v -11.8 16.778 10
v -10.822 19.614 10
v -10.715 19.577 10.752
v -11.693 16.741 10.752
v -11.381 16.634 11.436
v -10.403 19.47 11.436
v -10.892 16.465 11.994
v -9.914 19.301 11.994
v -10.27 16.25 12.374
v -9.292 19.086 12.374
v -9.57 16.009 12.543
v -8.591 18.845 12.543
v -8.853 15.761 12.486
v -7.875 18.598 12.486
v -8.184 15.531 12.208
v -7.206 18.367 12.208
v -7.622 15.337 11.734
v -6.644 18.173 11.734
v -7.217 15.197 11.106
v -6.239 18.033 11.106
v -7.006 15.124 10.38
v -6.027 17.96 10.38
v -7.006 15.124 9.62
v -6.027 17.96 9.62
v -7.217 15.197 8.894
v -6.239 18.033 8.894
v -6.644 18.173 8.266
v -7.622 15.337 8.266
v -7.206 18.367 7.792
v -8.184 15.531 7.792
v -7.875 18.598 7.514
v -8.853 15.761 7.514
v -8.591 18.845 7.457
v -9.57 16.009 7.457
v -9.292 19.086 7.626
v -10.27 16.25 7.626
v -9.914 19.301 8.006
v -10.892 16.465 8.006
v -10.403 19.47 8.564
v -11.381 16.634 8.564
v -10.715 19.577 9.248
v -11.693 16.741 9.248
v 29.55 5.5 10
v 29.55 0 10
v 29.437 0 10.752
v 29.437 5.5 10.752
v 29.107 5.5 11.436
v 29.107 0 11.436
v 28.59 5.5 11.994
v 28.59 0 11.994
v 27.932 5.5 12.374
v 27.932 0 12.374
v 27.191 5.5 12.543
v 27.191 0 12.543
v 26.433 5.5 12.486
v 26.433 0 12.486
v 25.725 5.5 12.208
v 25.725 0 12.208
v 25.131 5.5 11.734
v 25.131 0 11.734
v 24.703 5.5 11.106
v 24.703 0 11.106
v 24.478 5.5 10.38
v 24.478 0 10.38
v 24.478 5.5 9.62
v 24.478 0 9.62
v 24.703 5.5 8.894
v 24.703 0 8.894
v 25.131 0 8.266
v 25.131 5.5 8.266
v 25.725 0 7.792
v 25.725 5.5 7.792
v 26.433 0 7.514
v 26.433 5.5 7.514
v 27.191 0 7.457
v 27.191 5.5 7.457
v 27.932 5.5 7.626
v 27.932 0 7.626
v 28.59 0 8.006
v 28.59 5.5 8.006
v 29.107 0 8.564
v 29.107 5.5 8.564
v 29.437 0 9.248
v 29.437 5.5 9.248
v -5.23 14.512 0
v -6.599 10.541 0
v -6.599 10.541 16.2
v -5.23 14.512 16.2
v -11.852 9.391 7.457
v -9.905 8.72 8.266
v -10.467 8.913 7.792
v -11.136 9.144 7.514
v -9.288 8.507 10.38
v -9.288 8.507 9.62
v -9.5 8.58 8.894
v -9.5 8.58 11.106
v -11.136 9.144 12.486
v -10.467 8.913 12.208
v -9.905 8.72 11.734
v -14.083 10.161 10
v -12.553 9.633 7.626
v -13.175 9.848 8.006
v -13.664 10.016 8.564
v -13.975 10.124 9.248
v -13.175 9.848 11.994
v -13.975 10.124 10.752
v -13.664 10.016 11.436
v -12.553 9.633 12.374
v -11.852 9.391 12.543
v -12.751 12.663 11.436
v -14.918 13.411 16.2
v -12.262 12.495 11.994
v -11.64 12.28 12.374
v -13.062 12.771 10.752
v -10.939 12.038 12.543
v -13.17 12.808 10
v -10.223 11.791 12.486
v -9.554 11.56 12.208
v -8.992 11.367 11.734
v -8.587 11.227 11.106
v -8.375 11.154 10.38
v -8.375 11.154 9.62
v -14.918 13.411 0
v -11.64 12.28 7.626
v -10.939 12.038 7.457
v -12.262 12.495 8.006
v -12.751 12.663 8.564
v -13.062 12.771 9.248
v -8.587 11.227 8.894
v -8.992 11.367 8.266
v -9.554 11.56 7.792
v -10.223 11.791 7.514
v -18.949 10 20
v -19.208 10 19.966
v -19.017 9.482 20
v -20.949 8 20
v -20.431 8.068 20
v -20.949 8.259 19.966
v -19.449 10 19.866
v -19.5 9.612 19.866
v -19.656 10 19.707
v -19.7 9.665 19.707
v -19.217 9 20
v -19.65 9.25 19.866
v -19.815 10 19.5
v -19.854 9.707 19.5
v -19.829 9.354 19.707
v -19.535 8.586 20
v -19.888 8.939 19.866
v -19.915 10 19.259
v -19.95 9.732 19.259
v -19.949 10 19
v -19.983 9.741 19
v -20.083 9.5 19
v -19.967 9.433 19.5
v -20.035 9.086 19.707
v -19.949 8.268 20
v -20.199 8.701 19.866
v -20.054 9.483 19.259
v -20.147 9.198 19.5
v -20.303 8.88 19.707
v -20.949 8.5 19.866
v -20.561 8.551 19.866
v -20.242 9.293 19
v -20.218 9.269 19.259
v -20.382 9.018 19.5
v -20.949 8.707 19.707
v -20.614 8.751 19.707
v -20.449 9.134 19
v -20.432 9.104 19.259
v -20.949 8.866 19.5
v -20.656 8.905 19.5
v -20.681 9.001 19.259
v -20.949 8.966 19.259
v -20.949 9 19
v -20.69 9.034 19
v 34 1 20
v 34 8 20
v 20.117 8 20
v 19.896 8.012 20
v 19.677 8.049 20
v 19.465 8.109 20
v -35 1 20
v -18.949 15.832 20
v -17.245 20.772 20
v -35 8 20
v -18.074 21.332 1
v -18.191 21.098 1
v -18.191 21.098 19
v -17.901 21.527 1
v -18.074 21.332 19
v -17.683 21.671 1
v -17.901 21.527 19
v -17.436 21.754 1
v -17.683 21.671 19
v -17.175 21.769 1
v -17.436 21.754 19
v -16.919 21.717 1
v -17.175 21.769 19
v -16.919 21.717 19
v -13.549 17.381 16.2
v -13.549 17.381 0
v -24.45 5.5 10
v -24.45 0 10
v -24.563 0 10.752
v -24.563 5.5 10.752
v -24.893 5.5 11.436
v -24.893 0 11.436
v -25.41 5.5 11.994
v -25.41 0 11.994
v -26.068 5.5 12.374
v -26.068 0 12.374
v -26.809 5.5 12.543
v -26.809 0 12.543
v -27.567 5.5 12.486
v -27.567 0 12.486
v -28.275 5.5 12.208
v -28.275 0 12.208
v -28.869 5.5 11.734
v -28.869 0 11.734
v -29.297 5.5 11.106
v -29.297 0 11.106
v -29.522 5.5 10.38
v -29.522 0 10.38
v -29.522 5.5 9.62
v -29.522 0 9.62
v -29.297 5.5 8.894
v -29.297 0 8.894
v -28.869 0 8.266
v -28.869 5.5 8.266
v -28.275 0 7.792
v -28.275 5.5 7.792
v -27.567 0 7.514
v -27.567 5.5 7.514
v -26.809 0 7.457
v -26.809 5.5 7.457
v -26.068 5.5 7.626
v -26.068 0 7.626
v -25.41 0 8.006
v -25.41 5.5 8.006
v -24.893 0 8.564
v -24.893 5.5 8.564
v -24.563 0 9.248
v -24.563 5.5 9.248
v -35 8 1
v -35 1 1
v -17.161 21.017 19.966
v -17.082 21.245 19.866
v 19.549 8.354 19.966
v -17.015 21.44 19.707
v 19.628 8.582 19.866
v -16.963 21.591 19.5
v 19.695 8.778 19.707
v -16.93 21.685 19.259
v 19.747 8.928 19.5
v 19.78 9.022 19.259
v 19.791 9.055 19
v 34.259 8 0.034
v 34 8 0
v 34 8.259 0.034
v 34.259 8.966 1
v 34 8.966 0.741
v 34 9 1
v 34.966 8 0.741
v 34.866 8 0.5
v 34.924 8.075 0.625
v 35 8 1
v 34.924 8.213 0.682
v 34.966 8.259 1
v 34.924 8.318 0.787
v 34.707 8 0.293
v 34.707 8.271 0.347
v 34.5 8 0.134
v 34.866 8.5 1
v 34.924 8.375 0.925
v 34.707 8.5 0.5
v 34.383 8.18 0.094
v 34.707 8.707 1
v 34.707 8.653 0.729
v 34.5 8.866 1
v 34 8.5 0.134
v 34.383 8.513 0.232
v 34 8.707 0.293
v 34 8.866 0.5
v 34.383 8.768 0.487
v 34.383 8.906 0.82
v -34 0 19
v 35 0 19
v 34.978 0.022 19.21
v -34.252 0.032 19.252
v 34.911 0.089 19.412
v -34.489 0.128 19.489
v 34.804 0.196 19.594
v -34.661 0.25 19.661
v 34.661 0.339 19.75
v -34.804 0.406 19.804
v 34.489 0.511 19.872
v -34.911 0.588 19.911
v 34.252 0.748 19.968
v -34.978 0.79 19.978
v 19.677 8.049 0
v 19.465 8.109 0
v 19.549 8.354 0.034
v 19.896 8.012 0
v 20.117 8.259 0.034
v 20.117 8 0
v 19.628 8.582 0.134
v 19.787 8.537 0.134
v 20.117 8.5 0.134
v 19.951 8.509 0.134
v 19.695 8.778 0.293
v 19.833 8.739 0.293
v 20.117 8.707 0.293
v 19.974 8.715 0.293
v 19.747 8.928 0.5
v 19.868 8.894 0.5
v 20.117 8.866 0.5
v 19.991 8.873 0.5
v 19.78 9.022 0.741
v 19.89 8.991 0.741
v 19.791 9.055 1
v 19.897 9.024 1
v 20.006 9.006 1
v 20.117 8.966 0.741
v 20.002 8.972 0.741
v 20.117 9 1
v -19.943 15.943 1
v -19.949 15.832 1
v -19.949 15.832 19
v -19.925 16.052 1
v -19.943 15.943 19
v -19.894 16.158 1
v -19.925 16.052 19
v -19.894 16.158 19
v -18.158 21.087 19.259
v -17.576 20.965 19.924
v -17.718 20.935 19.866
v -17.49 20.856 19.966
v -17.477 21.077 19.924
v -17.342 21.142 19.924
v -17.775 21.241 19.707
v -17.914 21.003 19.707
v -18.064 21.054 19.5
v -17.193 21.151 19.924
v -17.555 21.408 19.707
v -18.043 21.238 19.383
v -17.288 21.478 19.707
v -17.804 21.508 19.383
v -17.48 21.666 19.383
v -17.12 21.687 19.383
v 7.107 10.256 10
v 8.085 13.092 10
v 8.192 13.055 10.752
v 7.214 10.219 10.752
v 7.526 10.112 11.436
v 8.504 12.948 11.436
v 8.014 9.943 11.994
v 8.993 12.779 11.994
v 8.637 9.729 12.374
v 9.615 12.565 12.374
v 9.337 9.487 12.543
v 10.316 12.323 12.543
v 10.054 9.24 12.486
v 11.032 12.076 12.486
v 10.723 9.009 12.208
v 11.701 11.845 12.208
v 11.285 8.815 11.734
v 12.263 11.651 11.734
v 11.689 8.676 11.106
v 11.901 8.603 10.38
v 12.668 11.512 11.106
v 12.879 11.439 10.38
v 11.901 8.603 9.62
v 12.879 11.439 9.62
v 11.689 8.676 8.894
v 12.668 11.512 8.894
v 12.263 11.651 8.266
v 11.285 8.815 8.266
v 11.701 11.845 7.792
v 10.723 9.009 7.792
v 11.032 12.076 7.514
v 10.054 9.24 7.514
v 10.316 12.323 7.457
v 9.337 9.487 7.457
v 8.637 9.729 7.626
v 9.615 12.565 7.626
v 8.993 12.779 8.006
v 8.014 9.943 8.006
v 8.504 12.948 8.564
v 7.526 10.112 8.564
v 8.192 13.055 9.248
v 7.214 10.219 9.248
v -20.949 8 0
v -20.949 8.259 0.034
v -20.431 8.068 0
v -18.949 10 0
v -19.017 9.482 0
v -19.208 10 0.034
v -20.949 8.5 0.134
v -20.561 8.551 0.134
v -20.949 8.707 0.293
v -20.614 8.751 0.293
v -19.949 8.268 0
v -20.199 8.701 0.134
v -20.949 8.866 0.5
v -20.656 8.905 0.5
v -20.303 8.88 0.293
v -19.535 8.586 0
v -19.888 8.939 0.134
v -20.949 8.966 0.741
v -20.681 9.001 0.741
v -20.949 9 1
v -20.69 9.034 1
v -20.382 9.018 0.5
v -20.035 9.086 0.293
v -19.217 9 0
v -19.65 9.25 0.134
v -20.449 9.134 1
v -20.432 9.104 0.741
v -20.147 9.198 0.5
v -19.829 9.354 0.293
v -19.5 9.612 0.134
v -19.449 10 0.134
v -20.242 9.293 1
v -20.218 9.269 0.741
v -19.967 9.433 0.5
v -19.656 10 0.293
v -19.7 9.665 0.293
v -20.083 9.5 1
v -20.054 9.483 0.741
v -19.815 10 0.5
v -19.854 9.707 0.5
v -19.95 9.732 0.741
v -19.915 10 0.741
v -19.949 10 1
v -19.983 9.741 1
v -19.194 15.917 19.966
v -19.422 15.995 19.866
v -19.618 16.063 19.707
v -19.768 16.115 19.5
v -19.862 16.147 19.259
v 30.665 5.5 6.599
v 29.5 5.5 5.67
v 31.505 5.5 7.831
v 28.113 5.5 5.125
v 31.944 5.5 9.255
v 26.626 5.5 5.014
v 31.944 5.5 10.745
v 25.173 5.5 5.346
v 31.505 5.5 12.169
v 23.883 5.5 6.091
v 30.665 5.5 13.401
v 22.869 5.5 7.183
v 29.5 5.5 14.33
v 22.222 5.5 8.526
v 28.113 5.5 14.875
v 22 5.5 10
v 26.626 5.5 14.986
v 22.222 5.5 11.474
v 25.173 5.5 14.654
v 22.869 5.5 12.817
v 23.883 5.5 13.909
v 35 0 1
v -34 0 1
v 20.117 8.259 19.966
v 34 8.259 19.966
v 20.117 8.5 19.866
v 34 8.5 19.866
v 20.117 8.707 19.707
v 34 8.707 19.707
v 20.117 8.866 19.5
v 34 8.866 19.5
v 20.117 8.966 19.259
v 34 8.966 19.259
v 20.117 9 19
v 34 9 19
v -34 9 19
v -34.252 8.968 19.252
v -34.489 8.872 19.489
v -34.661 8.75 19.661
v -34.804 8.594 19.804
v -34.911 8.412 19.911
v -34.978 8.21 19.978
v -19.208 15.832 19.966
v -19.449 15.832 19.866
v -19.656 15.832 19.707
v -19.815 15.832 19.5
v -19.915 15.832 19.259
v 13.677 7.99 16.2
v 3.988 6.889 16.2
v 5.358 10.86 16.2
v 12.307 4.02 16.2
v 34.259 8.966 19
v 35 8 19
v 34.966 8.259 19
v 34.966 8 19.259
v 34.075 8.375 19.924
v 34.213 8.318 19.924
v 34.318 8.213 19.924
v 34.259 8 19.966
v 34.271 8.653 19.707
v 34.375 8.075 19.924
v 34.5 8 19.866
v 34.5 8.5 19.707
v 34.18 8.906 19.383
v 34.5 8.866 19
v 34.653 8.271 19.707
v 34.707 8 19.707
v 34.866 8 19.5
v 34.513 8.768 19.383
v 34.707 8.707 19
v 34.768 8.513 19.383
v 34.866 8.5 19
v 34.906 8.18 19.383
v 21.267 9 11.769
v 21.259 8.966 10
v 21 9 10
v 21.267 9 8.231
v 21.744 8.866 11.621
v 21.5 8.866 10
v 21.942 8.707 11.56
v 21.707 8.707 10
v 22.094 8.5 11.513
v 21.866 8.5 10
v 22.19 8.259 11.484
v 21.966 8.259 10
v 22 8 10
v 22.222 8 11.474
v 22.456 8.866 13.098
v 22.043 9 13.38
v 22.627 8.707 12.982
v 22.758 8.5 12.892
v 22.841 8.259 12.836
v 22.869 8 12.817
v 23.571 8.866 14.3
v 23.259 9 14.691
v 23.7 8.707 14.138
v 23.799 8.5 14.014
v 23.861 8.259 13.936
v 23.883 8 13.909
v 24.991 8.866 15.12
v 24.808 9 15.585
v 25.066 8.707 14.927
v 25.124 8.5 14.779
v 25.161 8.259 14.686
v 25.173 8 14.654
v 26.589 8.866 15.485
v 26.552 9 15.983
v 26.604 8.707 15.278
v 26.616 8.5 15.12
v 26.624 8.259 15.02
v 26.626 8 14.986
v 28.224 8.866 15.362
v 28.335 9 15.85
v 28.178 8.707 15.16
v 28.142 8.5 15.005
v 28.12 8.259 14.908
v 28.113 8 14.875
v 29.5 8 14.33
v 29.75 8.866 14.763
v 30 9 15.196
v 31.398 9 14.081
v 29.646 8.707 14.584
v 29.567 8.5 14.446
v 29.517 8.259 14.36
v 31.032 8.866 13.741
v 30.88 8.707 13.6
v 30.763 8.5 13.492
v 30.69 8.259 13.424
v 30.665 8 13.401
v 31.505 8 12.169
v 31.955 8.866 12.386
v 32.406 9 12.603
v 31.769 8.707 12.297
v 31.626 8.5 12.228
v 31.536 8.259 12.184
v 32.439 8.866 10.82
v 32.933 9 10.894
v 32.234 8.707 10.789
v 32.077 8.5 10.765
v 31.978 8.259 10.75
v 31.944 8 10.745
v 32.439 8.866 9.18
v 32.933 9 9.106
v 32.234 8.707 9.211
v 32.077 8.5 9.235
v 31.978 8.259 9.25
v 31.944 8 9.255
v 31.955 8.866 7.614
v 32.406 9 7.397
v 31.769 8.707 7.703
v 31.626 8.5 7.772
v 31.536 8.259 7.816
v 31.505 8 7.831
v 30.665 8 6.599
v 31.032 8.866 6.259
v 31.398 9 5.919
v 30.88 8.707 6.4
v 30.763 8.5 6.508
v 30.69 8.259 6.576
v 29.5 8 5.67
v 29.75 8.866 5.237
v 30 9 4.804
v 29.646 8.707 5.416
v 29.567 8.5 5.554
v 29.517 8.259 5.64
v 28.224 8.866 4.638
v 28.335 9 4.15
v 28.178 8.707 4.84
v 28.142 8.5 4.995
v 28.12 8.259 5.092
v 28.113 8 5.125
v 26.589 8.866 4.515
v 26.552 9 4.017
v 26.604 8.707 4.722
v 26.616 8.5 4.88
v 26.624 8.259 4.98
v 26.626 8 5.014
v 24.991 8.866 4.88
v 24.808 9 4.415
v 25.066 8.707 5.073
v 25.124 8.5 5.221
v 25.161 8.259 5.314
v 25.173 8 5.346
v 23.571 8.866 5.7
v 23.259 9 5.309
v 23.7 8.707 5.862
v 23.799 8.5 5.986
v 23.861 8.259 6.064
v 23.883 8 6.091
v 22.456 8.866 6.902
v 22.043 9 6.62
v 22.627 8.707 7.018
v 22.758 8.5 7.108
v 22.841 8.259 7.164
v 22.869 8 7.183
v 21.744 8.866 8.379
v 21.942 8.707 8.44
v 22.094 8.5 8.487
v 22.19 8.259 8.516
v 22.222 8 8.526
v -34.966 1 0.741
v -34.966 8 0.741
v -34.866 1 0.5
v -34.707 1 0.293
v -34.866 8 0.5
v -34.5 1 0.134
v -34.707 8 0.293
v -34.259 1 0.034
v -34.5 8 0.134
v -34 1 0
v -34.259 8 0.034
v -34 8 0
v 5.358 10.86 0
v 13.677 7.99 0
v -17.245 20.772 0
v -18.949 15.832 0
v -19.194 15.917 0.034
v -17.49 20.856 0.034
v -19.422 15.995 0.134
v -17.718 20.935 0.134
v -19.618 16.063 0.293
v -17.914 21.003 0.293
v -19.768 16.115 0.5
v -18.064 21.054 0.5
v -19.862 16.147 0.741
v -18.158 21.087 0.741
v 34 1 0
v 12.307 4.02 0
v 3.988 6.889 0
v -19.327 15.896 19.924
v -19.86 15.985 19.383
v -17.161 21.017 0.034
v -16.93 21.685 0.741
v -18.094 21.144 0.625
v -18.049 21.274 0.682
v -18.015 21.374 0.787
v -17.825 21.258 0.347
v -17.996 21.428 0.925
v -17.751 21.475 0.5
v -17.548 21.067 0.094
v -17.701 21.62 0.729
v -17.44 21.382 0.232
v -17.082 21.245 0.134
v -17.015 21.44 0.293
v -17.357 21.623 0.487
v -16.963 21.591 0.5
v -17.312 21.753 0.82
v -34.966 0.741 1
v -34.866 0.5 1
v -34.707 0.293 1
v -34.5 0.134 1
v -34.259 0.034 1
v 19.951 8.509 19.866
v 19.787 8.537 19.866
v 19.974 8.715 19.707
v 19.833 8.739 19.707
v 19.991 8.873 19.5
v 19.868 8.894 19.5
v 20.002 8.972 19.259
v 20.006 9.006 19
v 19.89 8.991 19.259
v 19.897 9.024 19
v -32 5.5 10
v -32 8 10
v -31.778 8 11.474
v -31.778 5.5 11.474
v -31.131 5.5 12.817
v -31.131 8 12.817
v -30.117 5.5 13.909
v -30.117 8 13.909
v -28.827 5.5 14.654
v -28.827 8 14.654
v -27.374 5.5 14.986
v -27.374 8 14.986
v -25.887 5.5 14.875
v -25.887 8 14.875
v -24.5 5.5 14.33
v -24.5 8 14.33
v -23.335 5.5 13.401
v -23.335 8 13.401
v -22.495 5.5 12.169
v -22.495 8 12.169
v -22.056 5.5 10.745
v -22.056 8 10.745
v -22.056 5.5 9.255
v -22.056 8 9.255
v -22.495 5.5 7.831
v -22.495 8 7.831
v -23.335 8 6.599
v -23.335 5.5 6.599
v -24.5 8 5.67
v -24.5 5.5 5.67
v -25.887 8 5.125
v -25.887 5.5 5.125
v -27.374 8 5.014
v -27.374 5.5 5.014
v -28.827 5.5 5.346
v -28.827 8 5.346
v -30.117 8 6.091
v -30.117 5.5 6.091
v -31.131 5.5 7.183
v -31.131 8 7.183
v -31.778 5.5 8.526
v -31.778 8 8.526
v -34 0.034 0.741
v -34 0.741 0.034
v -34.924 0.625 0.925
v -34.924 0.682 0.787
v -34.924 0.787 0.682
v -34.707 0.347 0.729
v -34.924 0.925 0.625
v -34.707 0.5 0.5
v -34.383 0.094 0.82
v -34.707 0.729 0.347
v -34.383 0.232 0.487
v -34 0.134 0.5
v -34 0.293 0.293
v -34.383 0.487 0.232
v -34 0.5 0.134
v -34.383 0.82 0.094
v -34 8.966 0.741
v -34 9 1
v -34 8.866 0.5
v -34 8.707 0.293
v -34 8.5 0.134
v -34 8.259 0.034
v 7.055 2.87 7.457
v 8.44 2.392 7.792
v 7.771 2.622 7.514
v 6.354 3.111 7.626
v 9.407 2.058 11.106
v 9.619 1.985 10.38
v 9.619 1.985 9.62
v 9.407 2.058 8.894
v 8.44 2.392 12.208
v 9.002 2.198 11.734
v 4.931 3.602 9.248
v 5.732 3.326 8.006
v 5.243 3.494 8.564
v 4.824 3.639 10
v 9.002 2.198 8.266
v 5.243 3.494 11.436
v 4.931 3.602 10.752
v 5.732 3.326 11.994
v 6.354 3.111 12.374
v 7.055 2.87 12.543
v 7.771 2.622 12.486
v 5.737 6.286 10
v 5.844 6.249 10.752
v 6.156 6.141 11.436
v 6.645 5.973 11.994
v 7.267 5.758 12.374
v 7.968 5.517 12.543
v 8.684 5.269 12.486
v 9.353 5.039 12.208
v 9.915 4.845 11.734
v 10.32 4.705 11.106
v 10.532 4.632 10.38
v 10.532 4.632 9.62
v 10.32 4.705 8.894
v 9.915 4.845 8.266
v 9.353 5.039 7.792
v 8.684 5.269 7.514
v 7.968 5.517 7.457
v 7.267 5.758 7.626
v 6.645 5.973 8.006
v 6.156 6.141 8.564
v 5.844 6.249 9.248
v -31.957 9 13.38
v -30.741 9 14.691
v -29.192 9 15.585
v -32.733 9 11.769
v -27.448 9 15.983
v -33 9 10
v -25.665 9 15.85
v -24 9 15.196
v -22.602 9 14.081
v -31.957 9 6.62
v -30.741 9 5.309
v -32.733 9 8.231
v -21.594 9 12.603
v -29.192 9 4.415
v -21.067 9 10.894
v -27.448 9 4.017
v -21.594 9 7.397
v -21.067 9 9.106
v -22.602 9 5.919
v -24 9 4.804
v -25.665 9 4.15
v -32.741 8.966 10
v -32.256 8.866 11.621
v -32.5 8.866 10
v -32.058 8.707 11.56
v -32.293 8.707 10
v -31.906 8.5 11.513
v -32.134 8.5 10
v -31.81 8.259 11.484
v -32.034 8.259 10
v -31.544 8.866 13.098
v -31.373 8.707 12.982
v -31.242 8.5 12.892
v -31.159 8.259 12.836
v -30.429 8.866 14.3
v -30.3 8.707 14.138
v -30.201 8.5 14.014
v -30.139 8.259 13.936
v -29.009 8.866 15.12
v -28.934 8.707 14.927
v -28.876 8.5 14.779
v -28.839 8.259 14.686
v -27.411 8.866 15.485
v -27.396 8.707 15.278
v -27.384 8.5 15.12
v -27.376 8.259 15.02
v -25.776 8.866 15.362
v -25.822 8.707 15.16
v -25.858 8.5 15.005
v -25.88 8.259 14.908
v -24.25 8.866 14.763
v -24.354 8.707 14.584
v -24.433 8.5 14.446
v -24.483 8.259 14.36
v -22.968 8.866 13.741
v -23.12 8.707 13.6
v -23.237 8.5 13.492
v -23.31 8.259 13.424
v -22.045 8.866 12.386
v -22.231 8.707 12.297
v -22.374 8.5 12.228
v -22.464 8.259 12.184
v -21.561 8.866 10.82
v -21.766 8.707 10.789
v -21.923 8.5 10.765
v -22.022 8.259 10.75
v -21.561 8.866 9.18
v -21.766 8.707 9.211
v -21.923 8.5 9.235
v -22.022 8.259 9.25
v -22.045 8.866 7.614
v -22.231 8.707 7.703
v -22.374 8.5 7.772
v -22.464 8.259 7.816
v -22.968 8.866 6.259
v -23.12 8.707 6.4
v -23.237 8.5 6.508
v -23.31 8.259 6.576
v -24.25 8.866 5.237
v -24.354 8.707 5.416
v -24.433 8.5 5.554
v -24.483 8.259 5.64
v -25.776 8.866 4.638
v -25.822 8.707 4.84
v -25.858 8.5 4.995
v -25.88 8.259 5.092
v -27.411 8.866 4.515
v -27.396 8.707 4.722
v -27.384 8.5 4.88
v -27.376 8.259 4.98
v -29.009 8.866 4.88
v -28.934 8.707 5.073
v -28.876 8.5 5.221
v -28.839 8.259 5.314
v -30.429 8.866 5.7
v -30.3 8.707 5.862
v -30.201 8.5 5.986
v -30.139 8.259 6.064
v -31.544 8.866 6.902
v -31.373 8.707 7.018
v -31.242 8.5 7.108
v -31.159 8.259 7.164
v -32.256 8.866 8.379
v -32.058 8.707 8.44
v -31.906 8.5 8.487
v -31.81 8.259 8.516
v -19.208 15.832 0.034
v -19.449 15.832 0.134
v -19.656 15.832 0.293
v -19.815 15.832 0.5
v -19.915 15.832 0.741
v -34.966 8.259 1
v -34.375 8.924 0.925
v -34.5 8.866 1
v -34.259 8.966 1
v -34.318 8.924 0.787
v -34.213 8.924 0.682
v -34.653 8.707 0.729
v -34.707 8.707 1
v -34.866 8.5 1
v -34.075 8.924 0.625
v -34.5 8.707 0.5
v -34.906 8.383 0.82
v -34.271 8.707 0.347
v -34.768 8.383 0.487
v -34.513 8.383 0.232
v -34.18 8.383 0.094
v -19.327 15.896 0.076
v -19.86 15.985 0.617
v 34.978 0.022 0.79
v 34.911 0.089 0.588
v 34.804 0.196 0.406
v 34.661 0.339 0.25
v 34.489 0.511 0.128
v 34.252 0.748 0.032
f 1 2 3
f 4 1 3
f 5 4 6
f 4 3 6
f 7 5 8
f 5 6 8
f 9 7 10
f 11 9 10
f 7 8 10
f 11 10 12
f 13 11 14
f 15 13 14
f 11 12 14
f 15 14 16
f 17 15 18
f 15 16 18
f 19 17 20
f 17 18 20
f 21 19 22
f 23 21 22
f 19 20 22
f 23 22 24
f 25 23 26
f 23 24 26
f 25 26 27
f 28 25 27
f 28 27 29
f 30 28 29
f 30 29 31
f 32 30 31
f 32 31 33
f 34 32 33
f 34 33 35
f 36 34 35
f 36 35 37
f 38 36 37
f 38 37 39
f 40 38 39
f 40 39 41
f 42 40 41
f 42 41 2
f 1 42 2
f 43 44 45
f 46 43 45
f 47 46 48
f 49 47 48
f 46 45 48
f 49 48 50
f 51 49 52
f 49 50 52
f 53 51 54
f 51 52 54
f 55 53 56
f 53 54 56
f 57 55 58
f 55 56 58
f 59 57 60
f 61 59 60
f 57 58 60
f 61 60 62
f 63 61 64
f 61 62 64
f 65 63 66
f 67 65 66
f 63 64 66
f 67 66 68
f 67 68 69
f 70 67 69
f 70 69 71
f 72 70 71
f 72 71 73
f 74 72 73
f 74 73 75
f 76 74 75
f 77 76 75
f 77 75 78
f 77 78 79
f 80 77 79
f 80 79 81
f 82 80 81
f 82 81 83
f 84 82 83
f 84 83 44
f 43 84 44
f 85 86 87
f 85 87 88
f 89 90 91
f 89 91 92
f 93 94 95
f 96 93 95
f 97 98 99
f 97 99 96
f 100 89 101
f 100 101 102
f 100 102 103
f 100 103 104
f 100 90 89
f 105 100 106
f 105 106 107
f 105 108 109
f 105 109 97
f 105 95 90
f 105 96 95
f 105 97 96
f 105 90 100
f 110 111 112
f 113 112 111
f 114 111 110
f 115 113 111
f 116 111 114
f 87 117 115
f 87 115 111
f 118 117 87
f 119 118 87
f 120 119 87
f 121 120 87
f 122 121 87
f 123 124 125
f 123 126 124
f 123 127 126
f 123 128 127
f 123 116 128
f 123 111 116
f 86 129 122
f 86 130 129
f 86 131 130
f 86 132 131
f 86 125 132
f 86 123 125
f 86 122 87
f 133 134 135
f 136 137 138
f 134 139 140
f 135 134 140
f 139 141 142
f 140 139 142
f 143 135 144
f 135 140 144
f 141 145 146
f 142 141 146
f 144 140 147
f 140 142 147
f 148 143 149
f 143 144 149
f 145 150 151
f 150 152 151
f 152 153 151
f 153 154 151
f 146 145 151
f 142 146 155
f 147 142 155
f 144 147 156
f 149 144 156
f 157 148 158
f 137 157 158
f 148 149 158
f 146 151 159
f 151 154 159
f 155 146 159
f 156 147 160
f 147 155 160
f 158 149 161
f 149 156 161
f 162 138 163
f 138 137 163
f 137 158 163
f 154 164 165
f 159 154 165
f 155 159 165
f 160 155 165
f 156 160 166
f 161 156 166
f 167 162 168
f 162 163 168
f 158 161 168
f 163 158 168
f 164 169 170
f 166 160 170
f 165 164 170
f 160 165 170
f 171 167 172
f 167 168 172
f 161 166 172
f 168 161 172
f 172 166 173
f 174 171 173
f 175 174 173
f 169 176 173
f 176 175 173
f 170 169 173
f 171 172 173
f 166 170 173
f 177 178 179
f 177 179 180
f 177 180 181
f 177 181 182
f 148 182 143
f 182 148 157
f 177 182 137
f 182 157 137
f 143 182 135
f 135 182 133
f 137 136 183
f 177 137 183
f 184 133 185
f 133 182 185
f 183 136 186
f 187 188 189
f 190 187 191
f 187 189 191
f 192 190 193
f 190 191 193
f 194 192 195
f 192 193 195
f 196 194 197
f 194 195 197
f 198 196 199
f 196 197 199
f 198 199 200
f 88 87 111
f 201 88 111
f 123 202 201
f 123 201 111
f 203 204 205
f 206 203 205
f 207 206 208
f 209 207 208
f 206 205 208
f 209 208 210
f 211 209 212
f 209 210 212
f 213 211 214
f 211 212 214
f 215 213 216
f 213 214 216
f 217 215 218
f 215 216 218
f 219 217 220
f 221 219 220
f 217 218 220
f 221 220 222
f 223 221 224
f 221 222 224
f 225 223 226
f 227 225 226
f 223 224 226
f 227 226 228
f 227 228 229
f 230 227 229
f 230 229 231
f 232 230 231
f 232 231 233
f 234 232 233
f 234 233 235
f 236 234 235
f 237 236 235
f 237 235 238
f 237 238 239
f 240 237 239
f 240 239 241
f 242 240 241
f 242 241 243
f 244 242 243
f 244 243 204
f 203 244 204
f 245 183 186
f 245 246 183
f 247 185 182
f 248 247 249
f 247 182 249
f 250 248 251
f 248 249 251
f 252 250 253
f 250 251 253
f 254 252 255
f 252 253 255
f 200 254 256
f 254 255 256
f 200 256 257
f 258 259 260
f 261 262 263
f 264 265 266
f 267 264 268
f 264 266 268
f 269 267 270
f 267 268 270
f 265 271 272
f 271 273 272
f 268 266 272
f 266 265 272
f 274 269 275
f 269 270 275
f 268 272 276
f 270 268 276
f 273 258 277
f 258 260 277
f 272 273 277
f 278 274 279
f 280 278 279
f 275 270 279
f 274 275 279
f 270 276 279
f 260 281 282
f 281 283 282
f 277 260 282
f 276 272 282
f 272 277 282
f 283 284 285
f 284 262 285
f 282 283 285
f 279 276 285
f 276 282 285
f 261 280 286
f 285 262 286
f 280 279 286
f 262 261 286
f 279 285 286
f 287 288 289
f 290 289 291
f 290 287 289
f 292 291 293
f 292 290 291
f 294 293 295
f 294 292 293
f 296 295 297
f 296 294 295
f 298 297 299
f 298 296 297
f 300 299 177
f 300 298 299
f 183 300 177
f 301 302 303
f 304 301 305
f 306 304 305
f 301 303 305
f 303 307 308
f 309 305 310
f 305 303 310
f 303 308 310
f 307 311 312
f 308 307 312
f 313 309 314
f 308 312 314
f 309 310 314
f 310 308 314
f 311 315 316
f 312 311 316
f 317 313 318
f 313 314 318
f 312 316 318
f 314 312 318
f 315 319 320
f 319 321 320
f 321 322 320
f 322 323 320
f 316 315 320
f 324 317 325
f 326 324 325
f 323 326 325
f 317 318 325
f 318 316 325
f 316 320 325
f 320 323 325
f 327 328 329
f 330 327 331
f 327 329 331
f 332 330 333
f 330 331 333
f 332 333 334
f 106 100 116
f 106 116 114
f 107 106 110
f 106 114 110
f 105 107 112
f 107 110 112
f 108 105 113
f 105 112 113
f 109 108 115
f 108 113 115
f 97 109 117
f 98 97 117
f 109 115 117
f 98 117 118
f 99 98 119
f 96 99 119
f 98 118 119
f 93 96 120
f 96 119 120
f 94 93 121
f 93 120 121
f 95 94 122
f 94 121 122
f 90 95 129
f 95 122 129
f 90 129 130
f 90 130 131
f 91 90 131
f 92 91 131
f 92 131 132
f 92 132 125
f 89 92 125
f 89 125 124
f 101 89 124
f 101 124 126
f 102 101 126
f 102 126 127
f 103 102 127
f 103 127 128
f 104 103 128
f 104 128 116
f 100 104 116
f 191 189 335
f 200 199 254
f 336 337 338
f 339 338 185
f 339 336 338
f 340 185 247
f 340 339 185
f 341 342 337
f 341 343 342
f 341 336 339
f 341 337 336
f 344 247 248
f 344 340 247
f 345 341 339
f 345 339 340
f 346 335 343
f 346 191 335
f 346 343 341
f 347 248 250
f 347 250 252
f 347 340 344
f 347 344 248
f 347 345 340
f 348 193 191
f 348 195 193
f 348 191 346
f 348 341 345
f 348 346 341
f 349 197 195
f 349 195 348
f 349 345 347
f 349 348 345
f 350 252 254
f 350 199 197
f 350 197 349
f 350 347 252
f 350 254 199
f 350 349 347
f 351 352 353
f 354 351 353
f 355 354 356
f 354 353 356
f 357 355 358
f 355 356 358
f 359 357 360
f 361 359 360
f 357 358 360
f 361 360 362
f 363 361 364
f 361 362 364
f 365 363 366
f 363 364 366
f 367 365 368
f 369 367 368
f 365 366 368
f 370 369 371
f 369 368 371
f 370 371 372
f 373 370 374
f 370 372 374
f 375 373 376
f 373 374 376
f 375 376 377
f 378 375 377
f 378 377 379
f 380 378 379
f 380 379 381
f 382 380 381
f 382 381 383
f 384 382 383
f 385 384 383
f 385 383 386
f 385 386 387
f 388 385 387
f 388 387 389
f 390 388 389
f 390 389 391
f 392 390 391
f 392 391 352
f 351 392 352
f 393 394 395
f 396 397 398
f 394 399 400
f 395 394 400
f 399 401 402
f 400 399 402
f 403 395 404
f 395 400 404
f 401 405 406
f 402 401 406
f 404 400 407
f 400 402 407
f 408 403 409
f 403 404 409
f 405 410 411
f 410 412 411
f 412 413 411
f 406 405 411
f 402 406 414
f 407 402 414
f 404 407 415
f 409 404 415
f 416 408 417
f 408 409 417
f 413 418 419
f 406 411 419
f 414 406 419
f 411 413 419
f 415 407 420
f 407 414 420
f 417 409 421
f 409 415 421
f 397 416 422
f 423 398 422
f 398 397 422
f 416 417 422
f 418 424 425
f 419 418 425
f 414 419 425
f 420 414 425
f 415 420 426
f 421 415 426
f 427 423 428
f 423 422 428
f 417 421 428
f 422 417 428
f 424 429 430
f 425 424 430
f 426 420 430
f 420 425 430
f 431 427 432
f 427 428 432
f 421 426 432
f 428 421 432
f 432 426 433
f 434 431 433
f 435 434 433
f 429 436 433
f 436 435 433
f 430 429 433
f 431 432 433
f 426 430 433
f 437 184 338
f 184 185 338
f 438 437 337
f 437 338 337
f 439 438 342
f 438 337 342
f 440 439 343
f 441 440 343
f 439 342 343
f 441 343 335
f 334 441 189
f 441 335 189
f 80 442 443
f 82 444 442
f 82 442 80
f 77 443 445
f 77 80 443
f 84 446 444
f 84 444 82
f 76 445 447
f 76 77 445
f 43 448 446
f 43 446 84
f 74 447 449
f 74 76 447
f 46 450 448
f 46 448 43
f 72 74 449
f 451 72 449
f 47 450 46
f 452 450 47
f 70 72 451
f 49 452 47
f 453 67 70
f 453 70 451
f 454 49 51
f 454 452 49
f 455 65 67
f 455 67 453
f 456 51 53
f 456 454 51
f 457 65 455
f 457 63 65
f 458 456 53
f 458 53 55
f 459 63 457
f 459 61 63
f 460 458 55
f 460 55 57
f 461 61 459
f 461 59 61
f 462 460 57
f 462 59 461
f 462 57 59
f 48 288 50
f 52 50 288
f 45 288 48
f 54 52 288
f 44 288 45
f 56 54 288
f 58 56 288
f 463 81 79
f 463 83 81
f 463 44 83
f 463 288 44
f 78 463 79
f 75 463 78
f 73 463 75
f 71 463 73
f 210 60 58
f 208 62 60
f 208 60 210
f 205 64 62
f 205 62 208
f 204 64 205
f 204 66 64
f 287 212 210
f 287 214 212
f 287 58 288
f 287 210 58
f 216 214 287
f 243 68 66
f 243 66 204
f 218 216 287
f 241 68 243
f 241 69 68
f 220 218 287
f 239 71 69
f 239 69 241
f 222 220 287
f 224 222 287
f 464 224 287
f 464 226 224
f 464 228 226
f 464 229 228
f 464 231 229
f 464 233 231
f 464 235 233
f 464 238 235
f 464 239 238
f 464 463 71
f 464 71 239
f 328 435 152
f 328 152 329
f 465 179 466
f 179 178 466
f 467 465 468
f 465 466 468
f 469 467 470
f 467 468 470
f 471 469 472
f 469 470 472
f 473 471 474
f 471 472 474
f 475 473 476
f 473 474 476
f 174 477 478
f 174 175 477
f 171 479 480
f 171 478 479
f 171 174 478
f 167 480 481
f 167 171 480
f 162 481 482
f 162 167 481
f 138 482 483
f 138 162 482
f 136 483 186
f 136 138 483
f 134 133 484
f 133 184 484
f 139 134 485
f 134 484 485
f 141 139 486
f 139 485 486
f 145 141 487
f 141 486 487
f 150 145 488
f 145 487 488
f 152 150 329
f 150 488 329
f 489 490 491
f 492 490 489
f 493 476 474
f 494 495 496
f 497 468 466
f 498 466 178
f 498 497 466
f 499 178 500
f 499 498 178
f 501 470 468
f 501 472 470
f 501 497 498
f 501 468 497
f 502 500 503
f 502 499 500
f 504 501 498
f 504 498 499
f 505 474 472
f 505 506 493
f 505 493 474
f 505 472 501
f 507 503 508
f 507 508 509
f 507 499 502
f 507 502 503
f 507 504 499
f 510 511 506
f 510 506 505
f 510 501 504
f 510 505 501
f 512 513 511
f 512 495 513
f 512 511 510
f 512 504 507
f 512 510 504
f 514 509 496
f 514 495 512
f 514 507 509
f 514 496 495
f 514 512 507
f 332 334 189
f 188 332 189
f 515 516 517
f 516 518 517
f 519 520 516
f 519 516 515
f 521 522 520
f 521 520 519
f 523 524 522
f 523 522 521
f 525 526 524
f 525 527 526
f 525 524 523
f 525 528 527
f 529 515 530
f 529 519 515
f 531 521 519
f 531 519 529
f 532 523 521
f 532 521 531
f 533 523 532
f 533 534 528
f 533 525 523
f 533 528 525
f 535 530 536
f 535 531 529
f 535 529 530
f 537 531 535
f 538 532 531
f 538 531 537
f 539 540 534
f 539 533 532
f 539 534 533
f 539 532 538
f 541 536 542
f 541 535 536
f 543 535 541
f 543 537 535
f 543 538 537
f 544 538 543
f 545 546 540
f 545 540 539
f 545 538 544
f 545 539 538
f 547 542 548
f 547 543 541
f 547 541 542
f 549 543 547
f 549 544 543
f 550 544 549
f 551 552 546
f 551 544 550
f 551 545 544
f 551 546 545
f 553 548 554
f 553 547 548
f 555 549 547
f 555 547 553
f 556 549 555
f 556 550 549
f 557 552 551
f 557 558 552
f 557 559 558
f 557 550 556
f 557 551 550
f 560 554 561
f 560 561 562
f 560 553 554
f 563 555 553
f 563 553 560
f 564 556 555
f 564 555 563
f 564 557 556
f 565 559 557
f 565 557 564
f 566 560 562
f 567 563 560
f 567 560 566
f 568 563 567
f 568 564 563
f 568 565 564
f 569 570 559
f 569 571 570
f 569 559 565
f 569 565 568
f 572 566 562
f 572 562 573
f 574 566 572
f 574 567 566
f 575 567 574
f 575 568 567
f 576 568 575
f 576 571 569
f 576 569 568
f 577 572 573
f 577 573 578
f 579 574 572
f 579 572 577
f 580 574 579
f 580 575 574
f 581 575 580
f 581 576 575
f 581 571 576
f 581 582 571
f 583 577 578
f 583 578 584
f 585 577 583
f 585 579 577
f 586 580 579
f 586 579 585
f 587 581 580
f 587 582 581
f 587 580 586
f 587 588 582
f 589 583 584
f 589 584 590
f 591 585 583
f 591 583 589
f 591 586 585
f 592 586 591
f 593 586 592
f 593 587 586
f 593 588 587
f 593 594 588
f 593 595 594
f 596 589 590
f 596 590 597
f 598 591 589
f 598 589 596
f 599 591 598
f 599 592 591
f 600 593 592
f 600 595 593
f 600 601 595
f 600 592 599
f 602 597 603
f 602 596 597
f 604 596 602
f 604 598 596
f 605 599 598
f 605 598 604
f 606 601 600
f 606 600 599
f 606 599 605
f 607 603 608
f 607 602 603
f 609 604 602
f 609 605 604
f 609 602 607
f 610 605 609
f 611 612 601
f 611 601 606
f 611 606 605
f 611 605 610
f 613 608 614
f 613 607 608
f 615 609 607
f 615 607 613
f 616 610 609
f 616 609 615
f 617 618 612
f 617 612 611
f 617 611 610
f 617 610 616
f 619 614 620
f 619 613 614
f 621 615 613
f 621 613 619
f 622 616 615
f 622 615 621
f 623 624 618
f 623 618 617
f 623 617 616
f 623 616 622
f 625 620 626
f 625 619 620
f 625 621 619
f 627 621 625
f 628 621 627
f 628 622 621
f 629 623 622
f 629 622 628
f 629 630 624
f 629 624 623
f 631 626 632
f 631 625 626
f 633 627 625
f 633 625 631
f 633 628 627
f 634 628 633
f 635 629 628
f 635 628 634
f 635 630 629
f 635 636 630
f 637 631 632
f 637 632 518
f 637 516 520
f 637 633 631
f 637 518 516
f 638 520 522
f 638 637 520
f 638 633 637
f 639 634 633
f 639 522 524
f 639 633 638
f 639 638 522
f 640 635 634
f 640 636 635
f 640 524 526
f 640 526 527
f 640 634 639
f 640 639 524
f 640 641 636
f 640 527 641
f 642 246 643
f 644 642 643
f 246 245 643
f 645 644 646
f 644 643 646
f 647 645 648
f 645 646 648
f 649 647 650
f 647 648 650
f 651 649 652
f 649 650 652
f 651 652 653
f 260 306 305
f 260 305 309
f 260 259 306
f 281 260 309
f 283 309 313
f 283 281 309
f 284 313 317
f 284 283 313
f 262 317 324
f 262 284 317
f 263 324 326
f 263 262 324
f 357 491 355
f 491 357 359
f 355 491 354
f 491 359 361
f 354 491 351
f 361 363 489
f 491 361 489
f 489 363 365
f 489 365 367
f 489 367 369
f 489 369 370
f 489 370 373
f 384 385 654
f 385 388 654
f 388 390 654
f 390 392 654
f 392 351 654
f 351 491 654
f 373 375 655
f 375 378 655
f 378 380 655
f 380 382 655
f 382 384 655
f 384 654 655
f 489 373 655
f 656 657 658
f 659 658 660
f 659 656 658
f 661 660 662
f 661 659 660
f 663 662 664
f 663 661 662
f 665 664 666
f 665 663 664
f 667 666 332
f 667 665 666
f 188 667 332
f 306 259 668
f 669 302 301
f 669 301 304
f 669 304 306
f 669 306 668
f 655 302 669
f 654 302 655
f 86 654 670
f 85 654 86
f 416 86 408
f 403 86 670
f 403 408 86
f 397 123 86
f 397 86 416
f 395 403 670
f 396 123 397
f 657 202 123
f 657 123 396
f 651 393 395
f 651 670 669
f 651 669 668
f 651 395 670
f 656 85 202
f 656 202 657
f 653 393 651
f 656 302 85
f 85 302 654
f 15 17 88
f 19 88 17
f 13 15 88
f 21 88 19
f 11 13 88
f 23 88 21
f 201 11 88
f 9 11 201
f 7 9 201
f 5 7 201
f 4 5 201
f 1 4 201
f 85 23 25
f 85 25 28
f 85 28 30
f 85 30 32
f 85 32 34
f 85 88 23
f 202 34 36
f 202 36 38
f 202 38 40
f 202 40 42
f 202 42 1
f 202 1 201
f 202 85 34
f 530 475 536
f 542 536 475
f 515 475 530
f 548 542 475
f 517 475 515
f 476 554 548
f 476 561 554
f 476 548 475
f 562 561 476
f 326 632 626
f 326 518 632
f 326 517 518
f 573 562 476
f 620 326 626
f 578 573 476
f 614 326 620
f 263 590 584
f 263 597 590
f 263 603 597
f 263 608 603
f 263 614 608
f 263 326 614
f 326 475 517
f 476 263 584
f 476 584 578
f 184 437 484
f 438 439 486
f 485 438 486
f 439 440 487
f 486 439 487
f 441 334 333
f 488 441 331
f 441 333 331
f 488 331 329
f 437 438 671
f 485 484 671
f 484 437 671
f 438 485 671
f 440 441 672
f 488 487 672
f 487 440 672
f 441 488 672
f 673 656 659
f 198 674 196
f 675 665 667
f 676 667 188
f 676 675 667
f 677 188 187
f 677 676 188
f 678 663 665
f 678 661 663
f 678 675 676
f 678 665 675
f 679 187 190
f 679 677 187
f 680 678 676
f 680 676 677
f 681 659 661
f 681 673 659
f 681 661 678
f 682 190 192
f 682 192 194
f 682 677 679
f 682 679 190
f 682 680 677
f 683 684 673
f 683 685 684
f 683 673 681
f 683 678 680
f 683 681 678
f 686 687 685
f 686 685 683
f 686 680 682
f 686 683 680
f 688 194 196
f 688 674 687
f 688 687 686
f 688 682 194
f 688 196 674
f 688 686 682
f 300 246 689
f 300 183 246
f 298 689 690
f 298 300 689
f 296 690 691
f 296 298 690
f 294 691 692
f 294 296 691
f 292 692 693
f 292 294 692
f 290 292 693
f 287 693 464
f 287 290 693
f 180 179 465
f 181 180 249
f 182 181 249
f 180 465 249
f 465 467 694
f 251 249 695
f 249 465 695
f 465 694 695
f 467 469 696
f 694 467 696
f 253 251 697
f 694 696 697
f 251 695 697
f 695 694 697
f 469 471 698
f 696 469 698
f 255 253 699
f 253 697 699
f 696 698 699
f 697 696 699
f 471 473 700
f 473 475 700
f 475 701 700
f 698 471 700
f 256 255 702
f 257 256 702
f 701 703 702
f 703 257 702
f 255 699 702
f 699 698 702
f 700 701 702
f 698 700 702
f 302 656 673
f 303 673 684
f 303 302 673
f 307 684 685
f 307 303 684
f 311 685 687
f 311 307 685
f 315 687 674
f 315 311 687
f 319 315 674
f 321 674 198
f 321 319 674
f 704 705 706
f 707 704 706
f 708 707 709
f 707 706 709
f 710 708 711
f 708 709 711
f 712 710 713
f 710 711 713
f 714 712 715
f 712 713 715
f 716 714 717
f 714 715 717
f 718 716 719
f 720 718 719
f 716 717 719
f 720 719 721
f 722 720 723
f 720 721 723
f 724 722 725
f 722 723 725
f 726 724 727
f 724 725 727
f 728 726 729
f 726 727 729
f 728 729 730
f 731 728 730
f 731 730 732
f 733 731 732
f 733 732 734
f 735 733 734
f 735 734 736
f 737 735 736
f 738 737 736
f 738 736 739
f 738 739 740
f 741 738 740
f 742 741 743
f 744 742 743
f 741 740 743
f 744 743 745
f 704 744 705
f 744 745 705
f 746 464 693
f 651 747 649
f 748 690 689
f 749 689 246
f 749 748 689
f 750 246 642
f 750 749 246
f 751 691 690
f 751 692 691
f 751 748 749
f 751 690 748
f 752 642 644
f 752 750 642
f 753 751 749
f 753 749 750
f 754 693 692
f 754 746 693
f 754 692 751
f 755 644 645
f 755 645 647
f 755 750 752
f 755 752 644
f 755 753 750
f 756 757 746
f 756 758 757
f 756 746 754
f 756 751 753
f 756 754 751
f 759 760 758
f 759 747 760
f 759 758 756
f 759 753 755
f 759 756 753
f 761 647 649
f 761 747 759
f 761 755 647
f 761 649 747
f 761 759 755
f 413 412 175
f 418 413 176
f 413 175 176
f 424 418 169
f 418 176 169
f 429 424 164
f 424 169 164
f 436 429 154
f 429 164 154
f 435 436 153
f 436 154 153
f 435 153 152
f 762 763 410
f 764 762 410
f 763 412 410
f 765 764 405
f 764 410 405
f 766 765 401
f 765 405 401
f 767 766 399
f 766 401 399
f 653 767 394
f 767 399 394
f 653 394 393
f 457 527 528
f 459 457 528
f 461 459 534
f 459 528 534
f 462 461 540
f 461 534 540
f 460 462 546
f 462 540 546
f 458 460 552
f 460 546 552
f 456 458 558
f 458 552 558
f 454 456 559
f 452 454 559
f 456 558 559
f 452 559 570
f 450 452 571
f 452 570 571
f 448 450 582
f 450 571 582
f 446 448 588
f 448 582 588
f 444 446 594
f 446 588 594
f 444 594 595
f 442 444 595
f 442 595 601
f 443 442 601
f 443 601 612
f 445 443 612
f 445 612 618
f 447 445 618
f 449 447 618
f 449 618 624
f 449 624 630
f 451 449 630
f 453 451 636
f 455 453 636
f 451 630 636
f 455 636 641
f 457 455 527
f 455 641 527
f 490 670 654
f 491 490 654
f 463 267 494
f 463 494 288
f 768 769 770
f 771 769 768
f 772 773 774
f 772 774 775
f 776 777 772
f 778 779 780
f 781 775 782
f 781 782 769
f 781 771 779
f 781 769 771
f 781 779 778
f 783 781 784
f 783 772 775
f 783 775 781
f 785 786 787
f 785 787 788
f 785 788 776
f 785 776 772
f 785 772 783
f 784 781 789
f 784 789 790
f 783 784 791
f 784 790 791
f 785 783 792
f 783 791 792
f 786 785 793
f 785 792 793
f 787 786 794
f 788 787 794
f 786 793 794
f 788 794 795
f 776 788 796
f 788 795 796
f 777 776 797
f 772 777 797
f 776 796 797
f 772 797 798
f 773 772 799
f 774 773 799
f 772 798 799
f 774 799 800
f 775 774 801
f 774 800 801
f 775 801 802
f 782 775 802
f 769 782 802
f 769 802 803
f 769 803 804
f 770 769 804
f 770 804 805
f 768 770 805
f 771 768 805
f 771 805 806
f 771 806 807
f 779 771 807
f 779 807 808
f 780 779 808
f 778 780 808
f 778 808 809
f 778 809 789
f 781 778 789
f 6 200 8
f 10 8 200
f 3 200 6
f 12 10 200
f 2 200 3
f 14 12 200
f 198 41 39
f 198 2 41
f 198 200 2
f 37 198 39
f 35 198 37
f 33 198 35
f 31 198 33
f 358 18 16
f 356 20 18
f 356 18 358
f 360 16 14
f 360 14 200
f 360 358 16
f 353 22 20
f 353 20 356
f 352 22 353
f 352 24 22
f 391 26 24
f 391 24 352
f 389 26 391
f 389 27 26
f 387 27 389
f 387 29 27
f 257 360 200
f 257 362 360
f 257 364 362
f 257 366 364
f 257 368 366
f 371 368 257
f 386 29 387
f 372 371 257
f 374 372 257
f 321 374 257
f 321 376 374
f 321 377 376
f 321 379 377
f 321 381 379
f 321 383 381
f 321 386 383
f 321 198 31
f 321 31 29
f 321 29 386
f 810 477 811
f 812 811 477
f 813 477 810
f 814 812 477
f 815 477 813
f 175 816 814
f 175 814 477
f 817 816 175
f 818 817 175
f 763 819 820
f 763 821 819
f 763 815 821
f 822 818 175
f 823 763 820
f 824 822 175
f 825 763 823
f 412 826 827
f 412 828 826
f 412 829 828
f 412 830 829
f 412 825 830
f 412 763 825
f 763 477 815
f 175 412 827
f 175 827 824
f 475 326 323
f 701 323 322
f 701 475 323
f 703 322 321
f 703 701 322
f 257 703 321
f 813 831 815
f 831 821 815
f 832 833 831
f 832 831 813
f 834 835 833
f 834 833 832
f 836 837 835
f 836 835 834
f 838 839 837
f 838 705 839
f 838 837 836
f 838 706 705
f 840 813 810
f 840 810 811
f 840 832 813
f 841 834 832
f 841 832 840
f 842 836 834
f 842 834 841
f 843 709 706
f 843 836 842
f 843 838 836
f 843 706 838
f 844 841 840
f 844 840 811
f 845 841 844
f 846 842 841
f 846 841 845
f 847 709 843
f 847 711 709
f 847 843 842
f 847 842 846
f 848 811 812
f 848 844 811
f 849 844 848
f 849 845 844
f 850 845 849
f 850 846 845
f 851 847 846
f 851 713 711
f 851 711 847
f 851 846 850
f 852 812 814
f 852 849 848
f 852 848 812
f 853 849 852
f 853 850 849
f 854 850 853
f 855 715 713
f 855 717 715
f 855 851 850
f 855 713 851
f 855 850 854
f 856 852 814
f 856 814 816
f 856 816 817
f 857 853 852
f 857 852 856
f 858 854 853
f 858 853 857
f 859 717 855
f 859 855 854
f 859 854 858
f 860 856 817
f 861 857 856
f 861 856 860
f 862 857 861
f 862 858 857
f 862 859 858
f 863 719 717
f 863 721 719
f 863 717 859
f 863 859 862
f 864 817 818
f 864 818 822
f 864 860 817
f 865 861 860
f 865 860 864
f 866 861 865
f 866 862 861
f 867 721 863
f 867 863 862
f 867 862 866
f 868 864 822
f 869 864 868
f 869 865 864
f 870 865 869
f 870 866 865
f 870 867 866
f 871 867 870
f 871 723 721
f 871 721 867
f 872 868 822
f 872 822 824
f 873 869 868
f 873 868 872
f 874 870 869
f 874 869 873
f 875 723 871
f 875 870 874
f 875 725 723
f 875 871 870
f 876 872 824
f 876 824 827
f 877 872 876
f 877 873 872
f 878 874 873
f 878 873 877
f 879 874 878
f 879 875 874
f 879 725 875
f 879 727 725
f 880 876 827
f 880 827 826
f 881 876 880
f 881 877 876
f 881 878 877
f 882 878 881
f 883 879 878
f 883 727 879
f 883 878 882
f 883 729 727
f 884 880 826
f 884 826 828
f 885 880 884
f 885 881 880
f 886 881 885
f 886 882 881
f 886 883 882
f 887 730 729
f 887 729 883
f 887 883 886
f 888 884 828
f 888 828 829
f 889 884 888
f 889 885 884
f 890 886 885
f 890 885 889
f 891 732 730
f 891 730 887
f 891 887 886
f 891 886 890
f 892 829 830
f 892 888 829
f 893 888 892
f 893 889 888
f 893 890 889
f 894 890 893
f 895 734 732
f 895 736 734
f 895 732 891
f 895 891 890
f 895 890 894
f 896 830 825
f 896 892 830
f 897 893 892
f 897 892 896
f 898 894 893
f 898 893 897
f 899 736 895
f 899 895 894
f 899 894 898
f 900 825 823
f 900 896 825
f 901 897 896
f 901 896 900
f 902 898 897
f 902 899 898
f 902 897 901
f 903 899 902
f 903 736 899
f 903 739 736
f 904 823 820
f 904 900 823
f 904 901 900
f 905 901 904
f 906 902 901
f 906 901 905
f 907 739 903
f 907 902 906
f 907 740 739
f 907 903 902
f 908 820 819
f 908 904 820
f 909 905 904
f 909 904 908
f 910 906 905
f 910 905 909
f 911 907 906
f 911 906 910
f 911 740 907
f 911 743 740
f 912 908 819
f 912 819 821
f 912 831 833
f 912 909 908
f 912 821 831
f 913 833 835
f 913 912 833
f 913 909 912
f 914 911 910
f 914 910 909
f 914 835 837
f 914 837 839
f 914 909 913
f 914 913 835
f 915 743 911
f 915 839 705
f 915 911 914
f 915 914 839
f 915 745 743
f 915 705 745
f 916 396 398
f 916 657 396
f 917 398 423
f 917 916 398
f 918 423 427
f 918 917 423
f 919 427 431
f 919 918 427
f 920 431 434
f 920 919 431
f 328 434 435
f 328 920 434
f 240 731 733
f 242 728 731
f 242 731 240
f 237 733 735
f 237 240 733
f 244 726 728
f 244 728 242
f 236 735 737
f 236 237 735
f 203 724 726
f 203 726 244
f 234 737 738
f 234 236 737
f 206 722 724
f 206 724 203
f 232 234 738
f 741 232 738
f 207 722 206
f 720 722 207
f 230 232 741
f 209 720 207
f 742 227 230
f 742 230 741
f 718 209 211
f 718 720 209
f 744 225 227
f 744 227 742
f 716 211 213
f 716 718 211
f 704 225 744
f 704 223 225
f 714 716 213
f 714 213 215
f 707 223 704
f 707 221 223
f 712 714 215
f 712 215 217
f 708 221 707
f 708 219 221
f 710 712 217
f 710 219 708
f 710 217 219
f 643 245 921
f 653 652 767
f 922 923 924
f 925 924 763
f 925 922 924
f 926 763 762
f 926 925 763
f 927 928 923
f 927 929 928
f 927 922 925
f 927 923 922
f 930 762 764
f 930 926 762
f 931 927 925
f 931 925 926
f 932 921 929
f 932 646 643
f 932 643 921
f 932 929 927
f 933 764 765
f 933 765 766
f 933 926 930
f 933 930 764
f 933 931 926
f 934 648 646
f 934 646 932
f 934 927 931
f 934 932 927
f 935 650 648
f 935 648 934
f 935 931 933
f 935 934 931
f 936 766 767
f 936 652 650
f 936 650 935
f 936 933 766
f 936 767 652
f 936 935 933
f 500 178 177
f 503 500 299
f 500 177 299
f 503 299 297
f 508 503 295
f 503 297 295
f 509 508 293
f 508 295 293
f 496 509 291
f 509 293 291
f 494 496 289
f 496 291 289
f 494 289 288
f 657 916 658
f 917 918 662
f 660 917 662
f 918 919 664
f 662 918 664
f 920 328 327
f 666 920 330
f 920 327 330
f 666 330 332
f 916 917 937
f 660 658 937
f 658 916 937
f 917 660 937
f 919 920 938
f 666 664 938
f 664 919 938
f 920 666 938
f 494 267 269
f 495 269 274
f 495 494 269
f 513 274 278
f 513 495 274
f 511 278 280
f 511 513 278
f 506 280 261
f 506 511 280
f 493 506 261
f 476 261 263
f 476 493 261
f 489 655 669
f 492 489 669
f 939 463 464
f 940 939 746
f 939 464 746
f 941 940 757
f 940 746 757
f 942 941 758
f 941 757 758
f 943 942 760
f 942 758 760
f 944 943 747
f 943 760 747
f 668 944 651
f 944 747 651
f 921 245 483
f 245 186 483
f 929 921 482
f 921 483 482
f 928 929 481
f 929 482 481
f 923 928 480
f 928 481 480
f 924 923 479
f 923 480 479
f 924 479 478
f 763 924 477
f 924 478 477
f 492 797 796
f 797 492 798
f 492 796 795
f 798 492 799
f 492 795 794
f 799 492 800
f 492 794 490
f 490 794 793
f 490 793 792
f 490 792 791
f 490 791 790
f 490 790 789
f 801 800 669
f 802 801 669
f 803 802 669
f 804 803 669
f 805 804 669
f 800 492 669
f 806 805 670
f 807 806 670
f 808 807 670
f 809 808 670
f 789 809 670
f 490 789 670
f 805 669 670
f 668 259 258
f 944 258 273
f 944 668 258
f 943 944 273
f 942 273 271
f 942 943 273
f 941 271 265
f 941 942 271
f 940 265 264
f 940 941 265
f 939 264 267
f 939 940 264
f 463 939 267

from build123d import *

# Parameters (mm, degrees)
PAD_DEPTH       = 20
SKETCH001_R     = 2.55
POCKET_DEPTH    = 22.0443961318
SKETCH002_R     = 2.55
POCKET001_DEPTH = 10
SKETCH003_R     = 5
POCKET002_DEPTH = 3.5
POCKET003_DEPTH = 16.2
FILLET_R        = 1


with BuildPart() as part:
    # Sketch → Pad (new body)
    with BuildSketch(Plane.XY):
        Polygon((-35, 0), (-35, 9), (-19.949111567, 9), (-19.949111567, 16), (-17.8645079021, 22.0433961318), (19.949111567, 9), (35, 9), (35, 0), align=None)
    extrude(amount=PAD_DEPTH)

    # Sketch001 (on Face8 of Pad) → Pocket (cut, through all)
    with BuildSketch(Plane.XZ):
        with Locations((-27, 10)):
            Circle(SKETCH001_R)
        with Locations((27, 10)):
            Circle(SKETCH001_R)
    extrude(amount=-POCKET_DEPTH, mode=Mode.SUBTRACT)

    # Sketch002 (on Face11 of Pocket) → Pocket001 (cut)
    with BuildSketch(Plane(origin=(4.8955675974, 14.1925560139, 0), x_dir=(-0.9453404867, 0.3260849033, 0), z_dir=(0.3260849033, 0.9453404867, 0))):
        with Locations((-5.9239387088, 10)):
            Circle(SKETCH002_R)
        with Locations((14.0760612912, 10)):
            Circle(SKETCH002_R)
    extrude(amount=-POCKET001_DEPTH, mode=Mode.SUBTRACT)

    # Sketch003 (on Face12 of Pocket001) → Pocket002 (cut)
    with BuildSketch(Plane(origin=(0, 9, 0), x_dir=(-1, 0, 0), z_dir=(0, 1, 0))):
        with Locations((-27, 10)):
            Circle(SKETCH003_R)
        with Locations((27, 10)):
            Circle(SKETCH003_R)
    extrude(amount=-POCKET002_DEPTH, mode=Mode.SUBTRACT)

    # Sketch004 (on Face4 of Pocket002) → Pocket003 (cut)
    with BuildSketch(Plane(origin=(0, 0, 0), x_dir=(1, 0, 0), z_dir=(0, 0, -1))):
        Polygon((-14.9184124801, -13.4108691689), (-6.5994161969, -10.5413220199), (-5.2298596031, -14.5117520642), (-13.5488558863, -17.3812992131), align=None)
        Polygon((3.9883972544, -6.889171103), (5.3579538482, -10.8596011473), (13.6769501314, -7.9900539983), (12.3073935376, -4.019623954), align=None)
    extrude(amount=-POCKET003_DEPTH, mode=Mode.SUBTRACT)

    # Fillet
    fillet_edges = [part.edges().sort_by_distance(p)[0] for p in [
        (0, 0, 0),
        (-35, 0, 10),
        (-35, 4.5, 0),
        (-35, 9, 10),
        (-27.474556, 9, 0),
        (1.042302, 15.521698, 0),
        (27.474556, 9, 0),
        (35, 4.5, 0),
        (-18.90681, 19.021698, 0),
        (-19.949112, 16, 10),
        (-19.949112, 12.5, 0),
        (35, 9, 10),
        (-17.864508, 22.043396, 10),
        (-18.90681, 19.021698, 20),
        (-19.949112, 12.5, 20),
        (-27.474556, 9, 20),
        (0, 0, 20),
        (27.474556, 9, 20),
        (35, 4.5, 20),
        (1.042302, 15.521698, 20),
        (19.949112, 9, 10),
        (-19.949112, 9, 10),
        (32, 9, 10),
        (-22, 9, 10),
    ]]
    fillet(fillet_edges, radius=FILLET_R)


solid = part.part
